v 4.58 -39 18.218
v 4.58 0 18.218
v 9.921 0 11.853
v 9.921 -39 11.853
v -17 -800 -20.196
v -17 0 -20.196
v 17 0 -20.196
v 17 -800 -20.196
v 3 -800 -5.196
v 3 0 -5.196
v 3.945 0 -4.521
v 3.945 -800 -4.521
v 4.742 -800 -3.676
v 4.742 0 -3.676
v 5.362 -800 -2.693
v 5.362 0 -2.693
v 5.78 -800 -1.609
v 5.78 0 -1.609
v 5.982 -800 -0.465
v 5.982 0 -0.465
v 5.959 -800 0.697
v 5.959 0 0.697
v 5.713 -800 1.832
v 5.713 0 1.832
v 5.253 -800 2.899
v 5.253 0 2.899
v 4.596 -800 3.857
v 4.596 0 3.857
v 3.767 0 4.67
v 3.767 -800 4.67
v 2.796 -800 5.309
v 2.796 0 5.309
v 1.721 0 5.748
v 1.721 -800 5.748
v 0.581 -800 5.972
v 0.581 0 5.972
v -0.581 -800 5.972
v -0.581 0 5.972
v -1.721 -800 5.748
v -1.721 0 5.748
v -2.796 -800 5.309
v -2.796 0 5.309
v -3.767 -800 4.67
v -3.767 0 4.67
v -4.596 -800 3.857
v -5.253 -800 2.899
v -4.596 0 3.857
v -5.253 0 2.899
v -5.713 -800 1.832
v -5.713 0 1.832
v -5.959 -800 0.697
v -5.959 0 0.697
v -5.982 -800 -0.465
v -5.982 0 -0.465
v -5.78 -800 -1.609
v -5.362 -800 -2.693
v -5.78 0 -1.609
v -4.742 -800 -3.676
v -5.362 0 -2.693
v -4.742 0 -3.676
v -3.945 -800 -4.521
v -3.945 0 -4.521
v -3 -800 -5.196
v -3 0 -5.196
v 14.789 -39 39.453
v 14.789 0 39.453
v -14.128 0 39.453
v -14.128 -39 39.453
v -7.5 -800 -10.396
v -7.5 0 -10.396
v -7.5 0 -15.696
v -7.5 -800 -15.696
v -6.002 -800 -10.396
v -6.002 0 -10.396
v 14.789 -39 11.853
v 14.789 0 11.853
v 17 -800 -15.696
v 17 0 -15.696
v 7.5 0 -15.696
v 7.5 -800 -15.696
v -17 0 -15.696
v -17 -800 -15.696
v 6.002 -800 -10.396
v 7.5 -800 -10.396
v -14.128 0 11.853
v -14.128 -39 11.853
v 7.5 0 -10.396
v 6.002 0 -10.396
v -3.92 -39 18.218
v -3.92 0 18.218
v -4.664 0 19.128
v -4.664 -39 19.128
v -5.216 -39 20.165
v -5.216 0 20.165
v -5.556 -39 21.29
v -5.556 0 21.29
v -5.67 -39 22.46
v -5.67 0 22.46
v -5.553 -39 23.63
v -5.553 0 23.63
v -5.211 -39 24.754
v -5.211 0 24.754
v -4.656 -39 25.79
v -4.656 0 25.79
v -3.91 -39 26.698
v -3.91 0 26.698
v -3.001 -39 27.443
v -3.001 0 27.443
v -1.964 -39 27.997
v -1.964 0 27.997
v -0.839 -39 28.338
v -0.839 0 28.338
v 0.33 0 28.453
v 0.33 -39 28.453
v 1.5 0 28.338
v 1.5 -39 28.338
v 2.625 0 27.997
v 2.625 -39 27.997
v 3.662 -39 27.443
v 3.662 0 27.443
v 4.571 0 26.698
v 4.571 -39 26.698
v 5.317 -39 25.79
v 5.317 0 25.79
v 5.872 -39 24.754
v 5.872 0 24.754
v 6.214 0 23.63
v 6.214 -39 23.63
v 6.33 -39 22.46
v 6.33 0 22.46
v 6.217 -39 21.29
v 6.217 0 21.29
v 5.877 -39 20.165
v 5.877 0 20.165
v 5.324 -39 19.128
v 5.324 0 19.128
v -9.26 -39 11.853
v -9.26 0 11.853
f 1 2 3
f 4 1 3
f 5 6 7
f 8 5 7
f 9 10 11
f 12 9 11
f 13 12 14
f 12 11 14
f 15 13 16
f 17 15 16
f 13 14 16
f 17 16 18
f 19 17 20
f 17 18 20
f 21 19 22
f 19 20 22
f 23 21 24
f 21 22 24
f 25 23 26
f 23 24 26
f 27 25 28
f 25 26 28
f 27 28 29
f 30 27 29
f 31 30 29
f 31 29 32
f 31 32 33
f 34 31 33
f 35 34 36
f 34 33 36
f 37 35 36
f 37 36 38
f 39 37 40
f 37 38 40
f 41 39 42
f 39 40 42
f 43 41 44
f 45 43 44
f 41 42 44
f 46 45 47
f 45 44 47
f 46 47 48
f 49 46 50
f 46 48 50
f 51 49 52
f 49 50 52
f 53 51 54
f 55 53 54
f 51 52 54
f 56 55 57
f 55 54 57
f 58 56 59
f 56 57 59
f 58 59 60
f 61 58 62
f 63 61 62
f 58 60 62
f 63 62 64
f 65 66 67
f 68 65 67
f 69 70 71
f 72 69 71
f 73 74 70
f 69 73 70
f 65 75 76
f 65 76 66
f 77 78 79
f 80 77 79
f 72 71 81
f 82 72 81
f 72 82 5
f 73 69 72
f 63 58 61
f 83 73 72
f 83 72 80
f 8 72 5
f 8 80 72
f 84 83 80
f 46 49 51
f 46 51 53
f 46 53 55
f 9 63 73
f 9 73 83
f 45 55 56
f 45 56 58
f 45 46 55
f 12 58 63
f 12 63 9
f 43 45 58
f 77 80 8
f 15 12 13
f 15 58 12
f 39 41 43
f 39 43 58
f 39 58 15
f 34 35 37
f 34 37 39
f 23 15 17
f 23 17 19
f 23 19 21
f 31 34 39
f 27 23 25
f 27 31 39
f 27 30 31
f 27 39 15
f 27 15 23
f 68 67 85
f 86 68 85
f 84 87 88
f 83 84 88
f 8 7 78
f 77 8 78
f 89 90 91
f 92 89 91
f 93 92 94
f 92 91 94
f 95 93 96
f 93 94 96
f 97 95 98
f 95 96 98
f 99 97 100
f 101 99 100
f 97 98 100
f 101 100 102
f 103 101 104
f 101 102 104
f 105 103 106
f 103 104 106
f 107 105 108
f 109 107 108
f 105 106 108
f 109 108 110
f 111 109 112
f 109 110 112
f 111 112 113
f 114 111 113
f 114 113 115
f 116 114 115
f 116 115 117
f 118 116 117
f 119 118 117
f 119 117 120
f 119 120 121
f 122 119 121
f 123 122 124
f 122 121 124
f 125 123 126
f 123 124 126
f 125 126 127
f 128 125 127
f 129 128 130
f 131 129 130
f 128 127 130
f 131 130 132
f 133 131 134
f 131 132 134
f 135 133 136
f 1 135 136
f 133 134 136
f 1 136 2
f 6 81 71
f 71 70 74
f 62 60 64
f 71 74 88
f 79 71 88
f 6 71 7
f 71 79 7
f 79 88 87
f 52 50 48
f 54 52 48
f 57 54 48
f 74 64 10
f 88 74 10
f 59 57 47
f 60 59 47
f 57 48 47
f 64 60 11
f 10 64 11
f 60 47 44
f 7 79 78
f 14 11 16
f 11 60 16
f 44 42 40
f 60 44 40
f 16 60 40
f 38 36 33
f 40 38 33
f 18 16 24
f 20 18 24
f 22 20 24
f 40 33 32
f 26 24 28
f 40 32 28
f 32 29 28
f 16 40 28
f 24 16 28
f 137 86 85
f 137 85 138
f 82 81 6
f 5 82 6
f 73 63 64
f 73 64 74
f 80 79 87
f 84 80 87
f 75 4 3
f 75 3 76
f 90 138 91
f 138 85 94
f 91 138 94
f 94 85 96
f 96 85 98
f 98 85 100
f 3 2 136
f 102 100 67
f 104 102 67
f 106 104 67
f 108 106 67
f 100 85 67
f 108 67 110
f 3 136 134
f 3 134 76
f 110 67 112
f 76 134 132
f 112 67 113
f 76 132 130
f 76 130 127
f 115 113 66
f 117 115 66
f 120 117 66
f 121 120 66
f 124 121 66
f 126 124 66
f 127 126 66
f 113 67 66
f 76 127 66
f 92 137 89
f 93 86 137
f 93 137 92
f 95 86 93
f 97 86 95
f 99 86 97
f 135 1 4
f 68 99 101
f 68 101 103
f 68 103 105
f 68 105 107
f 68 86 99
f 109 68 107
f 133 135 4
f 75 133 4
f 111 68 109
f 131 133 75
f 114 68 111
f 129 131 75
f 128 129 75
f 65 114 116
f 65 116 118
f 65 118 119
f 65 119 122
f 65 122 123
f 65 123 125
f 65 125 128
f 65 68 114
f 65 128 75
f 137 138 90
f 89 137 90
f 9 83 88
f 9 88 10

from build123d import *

# Parameters (mm, degrees)
F1_DEPTH = 800
F2_DEPTH = 39


with BuildPart() as f1:
    # F0 (on Front) → F1 (new body)
    with BuildSketch(Plane.XZ):
        with BuildLine():
            ThreePointArc((3, -5.196152), (0, 6), (-3, -5.196152))
            Line((-3, -5.196152), (-6.002221, -10.396152))
            Line((-6.002221, -10.396152), (-7.5, -10.396152))
            Line((-7.5, -10.396152), (-7.5, -15.696152))
            Line((-7.5, -15.696152), (-17, -15.696152))
            Line((-17, -15.696152), (-17, -20.196152))
            Line((-17, -20.196152), (17, -20.196152))
            Line((17, -20.196152), (17, -15.696152))
            Line((17, -15.696152), (7.5, -15.696152))
            Line((7.5, -15.696152), (7.5, -10.396152))
            Line((7.5, -10.396152), (6.002221, -10.396152))
            Line((6.002221, -10.396152), (3, -5.196152))
        make_face()
    extrude(amount=F1_DEPTH)


with BuildPart() as f2:
    # F0 (on Front) → F2 (new body)
    with BuildSketch(Plane.XZ):
        with BuildLine():
            Line((14.78852, 39.453124), (-14.127764, 39.453124))
            Line((-14.127764, 39.453124), (-14.127764, 11.853124))
            Line((-14.127764, 11.853124), (-9.260266, 11.853124))
            Line((-9.260266, 11.853124), (-3.919622, 18.217856))
            ThreePointArc((-3.919622, 18.217856), (0.330378, 28.453124), (4.580378, 18.217856))
            Line((4.580378, 18.217856), (9.921022, 11.853124))
            Line((9.921022, 11.853124), (14.78852, 11.853124))
            Line((14.78852, 11.853124), (14.78852, 39.453124))
        make_face()
    extrude(amount=F2_DEPTH)


solid = Compound([f1.part, f2.part])
